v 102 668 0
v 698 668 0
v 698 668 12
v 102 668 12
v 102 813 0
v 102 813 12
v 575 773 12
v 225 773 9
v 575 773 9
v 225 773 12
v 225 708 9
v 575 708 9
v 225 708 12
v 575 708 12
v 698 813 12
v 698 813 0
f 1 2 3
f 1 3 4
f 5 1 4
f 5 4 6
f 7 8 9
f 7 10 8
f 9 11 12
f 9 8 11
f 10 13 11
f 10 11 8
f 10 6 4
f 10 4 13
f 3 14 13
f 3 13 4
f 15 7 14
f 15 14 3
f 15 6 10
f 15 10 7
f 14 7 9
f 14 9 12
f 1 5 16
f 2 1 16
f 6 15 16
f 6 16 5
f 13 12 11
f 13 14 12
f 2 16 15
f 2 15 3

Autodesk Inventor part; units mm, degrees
ref_plane "YZ Plane" through (0, 0, 0) normal (1, 0, 0) x (0, 1, 0)
ref_plane "XZ Plane" through (0, 0, 0) normal (0, 1, 0) x (-1, 0, 0)
ref_plane "XY Plane" through (0, 0, 0) normal (0, 0, 1) x (1, 0, 0)
sketch "Sketch1" plane through (0, 0, 0) normal (0, 0, 1) x (1, 0, 0)
  line L0 (-1498, 0) -> (1498, 0) construction
  line L1 (-1498, 0) -> (-898, 0)
  line L2 (-898, 0) -> (-898, 2068)
  line L3 (-898, 2068) -> (-1498, 2068)
  line L4 (-1498, 2068) -> (-1498, 0)
  line L5 (-898, 0) -> (-498, 0)
  line L6 (-498, 0) -> (-498, 816)
  line L7 (-498, 816) -> (-898, 816)
  line L8 (-898, 816) -> (-898, 0)
  line L9 (-498, 0) -> (102, 0)
  line L10 (102, 0) -> (102, 816)
  line L11 (102, 816) -> (-498, 816)
  line L12 (-498, 816) -> (-498, 0)
  line L13 (102, 0) -> (698, 0)
  line L14 (698, 0) -> (698, 668)
  line L15 (698, 668) -> (102, 668)
  line L16 (102, 668) -> (102, 0)
  line L17 (698, 0) -> (1498, 0)
  line L18 (1498, 0) -> (1498, 816)
  line L19 (1498, 816) -> (698, 816)
  line L20 (698, 816) -> (698, 0)
  line L21 (-1498, 0) -> (1498, 0)
  line L22 (1498, 0) -> (1498, 96)
  line L23 (1498, 96) -> (-1498, 96)
  line L24 (-1498, 96) -> (-1498, 0)
  line L25 (-898, 816) -> (1498, 816)
  line L26 (1498, 816) -> (1498, 832)
  line L27 (1498, 832) -> (-898, 832)
  line L28 (-898, 832) -> (-898, 816)
  line L29 (-898, 1972) -> (-498, 1972)
  line L30 (-498, 1972) -> (-498, 1372)
  line L31 (-498, 1372) -> (-898, 1372)
  line L32 (-898, 1372) -> (-898, 1972)
  line L33 (698, 1972) -> (1498, 1972)
  line L34 (1498, 1972) -> (1498, 1372)
  line L35 (1498, 1372) -> (698, 1372)
  line L36 (698, 1372) -> (698, 1972)
  line L37 (698, 1372) -> (98, 1372)
  line L38 (98, 1372) -> (98, 1972)
  line L39 (98, 1972) -> (698, 1972)
  line L40 (698, 1972) -> (698, 1372)
  line L41 (-498, 1372) -> (98, 1372)
  line L42 (-498, 1372) -> (-275, 1637.7611)
  line L43 (98, 1372) -> (-125, 1637.7611)
  line L44 (-275, 1637.7611) -> (-125, 1637.7611)
  line L45 (-125, 1637.7611) -> (-125, 2068)
  line L46 (-125, 2068) -> (-275, 2068)
  line L47 (-275, 2068) -> (-275, 1637.7611)
  line L48 (1098, 816) -> (1098, 96)
  line L49 (-198, 816) -> (-198, 96)
  line L50 (-898, 668) -> (-498, 668)
  line L51 (-1498, 520) -> (-898, 520)
  line L52 (-1498, 1579) -> (-898, 1579)
  line L53 (398, 1972) -> (398, 1372)
  line L54 (1098, 1972) -> (1098, 1372)
  line L55 (698, 1876) -> (1498, 1876)
  line L56 (698, 1468) -> (1498, 1468)
  line L57 (-1498, 1049.5) -> (-898, 1049.5)
  point P0 (0, 0)
  point P1 (0, 0)
  point P2 (0, 0)
  point P3 (-198, 816)
  point P4 (0, 0)
  point P5 (102, 668)
  dimension "d0" = 2996
  dimension "d1" = 600
  dimension "d2" = 2068
  dimension "d3" = 400
  dimension "d4" = 816
  dimension "d5" = 600
  dimension "d6" = 816
  dimension "d7" = 596
  dimension "d8" = 668
  dimension "d9" = 800
  dimension "d10" = 816
  dimension "d11" = 96
  dimension "d12" = 16
  dimension "d13" = 400
  dimension "d14" = 600
  dimension "d15" = 96
  dimension "d16" = 800
  dimension "d17" = 600
  dimension "d18" = 600
  dimension "d19" = 600
  dimension "d20" = 50
  dimension "d21" = 150
  dimension "d22" = 148
  dimension "d23" = 1059
  dimension "d24" = 96
  dimension "d25" = 96
  dimension "d26" = 529.5
extrude "Extrusion1" add sketch "Sketch1" along normal blind 12 contours L10 L25 L20 L15
sketch "Sketch2" plane through (0, 0, 12) normal (0, 0, 1) x (1, 0, 0)
  line L0 (698, 816) -> (102, 816) projected
  line L1 (102, 816) -> (698, 816)
  line L2 (698, 816) -> (698, 813)
  line L3 (698, 813) -> (102, 813)
  line L4 (102, 813) -> (102, 816)
  point P0 (0, 0)
  dimension "d29" = 3
extrude "Extrusion2" cut sketch "Sketch2" against normal blind 67
sketch "Sketch3" plane through (0, 0, 12) normal (0, 0, 1) x (1, 0, 0)
  line L0 (225, 773) -> (575, 773)
  line L1 (575, 773) -> (575, 708)
  line L2 (575, 708) -> (225, 708)
  line L3 (225, 708) -> (225, 773)
  line L4 (698, 668) -> (698, 813) projected
  line L5 (698, 813) -> (102, 813) projected
  point P0 (0, 0)
  point P1 (575, 740.5)
  point P2 (698, 740.5)
  point P3 (400, 773)
  point P4 (400, 813)
  dimension "d32" = 65
  dimension "d33" = 350
extrude "Extrusion3" cut sketch "Sketch3" against normal blind 3
properties part number "Dummy Washing Machine"
